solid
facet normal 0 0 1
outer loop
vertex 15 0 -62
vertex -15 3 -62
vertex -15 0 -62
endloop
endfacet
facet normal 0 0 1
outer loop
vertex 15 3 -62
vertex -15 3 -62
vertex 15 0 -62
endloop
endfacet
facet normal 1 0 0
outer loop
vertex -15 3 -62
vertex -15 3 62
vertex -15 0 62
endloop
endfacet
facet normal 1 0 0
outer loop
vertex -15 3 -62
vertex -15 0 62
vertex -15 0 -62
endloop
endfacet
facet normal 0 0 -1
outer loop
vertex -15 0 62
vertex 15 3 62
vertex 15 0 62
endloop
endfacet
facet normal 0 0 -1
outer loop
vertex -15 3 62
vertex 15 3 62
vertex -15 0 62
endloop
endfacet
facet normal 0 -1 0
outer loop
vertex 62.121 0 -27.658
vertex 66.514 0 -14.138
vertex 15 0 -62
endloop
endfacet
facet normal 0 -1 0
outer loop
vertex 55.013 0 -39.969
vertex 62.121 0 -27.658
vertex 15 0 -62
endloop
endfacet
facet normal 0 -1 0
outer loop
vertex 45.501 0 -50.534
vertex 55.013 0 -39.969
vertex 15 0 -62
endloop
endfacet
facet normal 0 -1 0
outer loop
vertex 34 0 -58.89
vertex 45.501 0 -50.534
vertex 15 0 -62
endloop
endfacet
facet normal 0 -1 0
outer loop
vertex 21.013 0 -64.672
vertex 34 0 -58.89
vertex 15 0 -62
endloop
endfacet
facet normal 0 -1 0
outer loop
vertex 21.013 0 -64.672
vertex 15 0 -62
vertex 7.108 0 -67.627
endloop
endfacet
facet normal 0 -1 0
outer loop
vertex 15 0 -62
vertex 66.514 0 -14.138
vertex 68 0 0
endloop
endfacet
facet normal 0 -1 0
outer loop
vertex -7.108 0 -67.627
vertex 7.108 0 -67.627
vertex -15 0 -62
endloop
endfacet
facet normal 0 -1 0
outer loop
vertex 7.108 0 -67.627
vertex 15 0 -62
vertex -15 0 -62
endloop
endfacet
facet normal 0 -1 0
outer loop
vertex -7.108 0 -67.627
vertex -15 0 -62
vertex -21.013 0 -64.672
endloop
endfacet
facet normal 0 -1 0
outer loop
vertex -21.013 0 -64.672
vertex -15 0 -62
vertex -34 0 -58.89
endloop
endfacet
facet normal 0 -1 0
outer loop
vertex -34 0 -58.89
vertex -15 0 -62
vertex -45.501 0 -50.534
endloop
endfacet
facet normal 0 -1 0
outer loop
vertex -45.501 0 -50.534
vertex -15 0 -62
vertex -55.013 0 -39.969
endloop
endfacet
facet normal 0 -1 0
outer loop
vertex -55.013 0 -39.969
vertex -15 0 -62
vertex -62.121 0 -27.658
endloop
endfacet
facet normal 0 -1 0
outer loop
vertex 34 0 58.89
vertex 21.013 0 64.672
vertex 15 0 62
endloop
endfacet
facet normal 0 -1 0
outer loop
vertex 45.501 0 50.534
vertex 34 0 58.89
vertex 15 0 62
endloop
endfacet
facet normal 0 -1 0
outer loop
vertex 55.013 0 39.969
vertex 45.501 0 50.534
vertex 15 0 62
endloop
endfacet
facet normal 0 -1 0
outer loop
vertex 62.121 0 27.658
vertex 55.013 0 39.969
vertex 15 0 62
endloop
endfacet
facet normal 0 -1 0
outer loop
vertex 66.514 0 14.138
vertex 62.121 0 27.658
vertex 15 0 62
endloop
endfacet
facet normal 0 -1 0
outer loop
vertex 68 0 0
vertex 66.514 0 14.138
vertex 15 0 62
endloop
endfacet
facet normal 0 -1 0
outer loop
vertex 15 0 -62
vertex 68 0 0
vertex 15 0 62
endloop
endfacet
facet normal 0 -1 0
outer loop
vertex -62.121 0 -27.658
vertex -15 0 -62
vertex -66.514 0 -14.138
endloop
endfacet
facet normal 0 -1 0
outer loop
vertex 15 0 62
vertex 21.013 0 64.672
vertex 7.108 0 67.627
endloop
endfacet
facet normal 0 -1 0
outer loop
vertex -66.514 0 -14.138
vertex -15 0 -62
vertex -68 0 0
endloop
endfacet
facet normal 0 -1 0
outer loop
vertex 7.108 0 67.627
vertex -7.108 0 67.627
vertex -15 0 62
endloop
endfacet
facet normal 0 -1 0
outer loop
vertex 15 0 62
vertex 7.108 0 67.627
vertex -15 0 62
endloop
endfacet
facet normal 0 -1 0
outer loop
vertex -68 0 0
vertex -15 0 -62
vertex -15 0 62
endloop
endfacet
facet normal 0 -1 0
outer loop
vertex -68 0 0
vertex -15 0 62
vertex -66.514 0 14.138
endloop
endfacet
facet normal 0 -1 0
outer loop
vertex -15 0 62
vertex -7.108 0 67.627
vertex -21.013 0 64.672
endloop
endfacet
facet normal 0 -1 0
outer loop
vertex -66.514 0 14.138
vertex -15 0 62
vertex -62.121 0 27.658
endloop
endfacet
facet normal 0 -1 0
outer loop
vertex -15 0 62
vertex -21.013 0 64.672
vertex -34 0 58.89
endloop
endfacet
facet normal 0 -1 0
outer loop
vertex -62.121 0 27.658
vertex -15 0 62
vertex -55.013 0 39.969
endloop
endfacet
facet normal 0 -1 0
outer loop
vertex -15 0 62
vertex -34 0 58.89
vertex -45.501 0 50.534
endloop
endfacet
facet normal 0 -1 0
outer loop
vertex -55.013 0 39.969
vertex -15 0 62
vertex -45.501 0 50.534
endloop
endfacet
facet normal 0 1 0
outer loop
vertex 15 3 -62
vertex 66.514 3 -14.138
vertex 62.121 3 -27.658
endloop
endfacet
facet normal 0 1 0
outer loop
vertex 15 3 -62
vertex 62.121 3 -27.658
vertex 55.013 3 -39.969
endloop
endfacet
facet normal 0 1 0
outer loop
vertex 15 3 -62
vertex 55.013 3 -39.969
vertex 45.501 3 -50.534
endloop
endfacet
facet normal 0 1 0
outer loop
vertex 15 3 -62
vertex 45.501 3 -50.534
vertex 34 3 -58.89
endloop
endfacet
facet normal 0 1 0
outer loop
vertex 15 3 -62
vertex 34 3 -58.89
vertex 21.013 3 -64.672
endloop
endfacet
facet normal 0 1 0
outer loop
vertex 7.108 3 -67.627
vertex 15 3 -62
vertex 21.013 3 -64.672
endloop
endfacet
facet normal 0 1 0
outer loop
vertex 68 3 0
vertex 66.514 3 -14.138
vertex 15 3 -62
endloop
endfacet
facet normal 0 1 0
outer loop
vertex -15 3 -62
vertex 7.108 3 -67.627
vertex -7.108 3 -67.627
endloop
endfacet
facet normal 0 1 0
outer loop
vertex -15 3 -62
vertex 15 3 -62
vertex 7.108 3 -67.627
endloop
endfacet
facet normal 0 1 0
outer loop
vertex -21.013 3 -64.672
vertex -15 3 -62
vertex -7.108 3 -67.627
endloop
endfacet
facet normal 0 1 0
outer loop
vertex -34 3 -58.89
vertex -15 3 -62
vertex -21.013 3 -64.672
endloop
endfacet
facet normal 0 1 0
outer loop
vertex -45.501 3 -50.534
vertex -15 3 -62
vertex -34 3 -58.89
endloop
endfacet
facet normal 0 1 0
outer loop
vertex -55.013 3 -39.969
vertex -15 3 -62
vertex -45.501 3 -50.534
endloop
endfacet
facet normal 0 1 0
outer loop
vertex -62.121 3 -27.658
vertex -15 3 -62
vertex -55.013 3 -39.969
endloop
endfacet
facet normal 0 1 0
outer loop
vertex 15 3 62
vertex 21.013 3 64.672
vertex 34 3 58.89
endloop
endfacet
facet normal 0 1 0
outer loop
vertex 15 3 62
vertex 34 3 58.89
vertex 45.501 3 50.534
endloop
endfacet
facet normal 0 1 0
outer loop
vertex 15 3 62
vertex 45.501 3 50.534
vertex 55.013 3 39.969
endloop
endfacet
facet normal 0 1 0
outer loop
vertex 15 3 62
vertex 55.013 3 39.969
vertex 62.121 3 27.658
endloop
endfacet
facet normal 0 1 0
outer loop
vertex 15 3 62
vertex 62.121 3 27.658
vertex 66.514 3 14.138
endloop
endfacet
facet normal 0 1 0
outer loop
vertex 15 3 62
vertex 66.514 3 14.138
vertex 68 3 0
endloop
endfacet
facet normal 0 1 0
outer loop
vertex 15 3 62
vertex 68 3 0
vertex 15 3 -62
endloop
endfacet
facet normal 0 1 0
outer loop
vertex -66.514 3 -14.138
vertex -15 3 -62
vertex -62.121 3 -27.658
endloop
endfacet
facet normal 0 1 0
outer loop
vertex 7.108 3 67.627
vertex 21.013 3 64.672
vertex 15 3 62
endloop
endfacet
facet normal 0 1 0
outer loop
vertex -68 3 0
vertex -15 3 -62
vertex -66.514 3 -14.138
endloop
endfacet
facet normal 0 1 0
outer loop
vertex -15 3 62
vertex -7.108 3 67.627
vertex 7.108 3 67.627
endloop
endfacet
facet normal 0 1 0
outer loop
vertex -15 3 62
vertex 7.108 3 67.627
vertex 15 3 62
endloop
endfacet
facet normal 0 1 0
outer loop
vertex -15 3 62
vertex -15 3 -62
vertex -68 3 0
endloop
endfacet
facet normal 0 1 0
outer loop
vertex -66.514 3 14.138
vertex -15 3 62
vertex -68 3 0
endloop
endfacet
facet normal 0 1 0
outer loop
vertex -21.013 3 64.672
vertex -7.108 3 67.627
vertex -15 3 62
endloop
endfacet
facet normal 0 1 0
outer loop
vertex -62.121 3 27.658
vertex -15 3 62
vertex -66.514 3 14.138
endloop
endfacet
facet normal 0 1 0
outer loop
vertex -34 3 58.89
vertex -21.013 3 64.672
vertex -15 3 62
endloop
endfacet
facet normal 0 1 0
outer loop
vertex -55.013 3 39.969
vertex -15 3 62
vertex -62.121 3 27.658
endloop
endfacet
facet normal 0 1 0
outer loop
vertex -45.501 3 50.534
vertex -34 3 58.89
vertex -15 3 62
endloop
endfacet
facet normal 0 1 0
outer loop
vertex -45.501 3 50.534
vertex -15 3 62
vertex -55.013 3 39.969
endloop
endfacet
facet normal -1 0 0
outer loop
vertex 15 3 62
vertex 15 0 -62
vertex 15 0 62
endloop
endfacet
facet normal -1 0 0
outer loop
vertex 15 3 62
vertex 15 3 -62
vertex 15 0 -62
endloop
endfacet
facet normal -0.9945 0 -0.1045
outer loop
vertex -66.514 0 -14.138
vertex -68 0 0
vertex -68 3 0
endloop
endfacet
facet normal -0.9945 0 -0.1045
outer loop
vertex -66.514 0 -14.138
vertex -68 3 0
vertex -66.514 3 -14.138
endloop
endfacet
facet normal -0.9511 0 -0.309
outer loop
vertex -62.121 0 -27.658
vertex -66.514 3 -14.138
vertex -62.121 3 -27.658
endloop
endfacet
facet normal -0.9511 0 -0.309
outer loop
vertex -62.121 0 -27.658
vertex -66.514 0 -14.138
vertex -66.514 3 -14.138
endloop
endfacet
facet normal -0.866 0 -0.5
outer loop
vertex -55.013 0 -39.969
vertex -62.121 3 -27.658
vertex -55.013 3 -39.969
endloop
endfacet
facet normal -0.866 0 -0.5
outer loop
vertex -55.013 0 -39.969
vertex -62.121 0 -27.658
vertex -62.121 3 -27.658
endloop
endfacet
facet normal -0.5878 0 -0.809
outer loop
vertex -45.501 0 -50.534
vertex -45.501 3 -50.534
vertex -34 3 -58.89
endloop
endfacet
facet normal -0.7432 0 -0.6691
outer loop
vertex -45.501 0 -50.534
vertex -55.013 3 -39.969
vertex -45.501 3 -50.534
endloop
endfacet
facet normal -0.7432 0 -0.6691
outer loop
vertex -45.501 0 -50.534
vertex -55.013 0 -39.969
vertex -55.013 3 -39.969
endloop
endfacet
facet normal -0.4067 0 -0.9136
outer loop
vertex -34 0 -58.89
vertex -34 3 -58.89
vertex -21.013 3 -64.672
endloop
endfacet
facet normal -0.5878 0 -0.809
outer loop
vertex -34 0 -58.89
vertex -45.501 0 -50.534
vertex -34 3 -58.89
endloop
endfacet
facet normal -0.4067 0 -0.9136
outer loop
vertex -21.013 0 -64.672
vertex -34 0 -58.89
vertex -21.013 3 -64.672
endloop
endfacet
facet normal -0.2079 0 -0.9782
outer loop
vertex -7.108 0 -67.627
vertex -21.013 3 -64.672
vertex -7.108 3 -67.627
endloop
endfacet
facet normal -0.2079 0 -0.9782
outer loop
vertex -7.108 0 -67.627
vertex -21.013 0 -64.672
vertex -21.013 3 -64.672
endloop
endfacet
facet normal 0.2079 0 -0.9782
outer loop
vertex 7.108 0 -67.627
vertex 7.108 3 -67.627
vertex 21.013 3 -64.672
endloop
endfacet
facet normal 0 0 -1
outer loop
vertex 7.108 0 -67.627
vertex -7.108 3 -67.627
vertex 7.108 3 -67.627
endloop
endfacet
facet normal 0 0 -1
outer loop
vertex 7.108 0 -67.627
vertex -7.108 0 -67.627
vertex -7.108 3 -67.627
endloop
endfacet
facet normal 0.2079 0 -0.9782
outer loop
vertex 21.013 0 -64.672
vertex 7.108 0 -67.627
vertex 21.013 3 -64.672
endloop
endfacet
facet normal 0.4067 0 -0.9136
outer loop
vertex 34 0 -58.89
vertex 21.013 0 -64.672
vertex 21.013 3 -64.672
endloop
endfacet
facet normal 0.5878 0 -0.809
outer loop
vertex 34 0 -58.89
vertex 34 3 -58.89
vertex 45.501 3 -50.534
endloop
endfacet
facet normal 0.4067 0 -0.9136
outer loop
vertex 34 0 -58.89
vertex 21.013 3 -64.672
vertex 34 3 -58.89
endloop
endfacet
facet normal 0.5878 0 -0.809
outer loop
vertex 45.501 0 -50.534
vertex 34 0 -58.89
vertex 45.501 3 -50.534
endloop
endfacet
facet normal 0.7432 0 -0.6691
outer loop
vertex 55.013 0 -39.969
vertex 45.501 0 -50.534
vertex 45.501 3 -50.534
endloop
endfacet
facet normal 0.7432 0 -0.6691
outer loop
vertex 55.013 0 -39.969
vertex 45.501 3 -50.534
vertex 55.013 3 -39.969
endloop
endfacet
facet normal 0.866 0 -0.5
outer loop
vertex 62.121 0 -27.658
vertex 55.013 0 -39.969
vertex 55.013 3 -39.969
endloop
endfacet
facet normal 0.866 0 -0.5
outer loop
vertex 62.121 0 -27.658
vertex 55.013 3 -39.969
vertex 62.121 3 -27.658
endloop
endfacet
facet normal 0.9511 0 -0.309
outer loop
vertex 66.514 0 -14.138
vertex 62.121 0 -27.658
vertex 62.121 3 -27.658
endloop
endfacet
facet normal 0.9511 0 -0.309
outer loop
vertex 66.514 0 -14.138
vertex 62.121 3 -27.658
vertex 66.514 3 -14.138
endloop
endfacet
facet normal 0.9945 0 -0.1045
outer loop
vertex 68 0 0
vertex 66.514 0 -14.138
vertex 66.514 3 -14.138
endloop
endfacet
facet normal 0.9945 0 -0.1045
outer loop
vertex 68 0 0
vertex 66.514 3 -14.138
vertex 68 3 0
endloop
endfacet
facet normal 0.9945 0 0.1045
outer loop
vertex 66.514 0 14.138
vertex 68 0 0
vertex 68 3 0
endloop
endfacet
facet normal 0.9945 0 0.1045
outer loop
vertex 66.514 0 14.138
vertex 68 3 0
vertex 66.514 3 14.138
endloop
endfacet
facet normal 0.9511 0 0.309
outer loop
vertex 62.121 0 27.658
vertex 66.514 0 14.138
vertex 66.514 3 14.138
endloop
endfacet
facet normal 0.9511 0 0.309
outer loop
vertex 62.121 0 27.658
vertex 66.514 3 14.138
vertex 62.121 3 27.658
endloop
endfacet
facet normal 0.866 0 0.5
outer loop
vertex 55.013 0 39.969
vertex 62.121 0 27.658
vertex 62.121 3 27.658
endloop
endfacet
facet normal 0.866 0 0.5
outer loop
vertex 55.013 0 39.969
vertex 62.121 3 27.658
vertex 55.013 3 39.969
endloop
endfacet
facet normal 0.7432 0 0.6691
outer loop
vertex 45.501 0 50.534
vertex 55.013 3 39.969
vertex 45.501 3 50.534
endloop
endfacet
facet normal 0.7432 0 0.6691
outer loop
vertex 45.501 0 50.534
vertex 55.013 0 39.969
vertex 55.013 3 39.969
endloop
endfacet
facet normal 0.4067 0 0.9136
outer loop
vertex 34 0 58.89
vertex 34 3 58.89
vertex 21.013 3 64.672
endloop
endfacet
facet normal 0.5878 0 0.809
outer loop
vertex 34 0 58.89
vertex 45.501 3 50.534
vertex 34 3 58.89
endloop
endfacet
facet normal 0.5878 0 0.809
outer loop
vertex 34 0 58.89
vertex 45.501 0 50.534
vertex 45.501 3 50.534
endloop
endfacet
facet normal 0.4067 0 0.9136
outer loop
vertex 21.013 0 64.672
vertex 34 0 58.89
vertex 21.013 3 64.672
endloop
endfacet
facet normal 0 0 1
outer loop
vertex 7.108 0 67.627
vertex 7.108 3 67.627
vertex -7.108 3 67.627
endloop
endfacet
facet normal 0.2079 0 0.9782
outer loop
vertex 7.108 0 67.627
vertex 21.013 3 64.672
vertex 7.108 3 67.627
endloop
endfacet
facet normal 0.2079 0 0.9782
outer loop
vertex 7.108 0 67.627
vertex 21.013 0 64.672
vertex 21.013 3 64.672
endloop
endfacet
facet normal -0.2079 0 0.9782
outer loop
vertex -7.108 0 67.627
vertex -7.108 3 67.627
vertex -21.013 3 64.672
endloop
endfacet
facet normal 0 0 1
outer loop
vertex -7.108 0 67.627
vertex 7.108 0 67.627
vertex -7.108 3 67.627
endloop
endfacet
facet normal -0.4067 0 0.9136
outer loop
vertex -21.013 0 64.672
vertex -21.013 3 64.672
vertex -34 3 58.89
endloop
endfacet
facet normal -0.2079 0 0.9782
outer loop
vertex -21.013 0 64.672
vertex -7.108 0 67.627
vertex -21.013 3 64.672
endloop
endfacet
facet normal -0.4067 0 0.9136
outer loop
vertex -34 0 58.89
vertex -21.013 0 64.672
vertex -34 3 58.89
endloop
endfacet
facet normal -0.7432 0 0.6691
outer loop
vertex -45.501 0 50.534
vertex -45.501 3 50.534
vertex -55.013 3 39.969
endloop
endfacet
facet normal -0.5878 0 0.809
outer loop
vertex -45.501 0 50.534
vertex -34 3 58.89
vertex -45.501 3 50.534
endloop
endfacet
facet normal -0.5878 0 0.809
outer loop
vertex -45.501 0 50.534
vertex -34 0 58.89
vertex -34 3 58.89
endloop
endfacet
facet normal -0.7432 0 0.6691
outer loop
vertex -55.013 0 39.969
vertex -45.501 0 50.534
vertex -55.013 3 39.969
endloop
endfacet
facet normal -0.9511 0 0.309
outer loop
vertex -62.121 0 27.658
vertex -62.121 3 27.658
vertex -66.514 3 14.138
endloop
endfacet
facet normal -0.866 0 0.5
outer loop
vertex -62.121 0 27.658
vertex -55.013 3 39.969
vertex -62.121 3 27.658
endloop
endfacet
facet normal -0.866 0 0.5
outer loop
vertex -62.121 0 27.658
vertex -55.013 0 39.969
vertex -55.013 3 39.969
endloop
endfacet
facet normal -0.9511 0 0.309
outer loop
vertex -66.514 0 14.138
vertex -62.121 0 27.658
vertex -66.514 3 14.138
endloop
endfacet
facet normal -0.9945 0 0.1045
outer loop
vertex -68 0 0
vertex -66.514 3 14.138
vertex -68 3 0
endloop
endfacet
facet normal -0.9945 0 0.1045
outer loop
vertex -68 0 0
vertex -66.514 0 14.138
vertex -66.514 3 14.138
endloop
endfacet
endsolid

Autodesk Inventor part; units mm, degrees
ref_plane "YZ Plane" through (0, 0, 0) normal (1, 0, 0) x (0, 1, 0)
ref_plane "XZ Plane" through (0, 0, 0) normal (0, 1, 0) x (-1, 0, 0)
ref_plane "XY Plane" through (0, 0, 0) normal (0, 0, 1) x (1, 0, 0)
sketch "Эскиз1" plane through (0, 0, 0) normal (0, 1, 0) x (-1, 0, 0)
  circle A0 centre (0, 0) radius 68
  dimension "d0" = 136
extrude "Выдавливание1" add sketch "Эскиз1" along normal blind 3
sketch "Эскиз2" plane through (0, 3, 0) normal (0, 1, 0) x (1, 0, 0)
  line L0 (15, -62) -> (-15, -62)
  line L1 (-15, -62) -> (-15, 62)
  line L2 (-15, 62) -> (15, 62)
  line L3 (15, 62) -> (15, -62)
  line L4 (15, -62) -> (-15, 62) construction
  line L5 (-15, -62) -> (15, 62) construction
  point P0 (0, 0)
  dimension "d3" = 30
  dimension "d4" = 124
extrude "Выдавливание2" cut sketch "Эскиз2" against normal blind 3
sketch "Эскиз3" plane through (0, 3, 0) normal (0, 1, 0) x (1, 0, 0)
  point P0 (0, 0)
